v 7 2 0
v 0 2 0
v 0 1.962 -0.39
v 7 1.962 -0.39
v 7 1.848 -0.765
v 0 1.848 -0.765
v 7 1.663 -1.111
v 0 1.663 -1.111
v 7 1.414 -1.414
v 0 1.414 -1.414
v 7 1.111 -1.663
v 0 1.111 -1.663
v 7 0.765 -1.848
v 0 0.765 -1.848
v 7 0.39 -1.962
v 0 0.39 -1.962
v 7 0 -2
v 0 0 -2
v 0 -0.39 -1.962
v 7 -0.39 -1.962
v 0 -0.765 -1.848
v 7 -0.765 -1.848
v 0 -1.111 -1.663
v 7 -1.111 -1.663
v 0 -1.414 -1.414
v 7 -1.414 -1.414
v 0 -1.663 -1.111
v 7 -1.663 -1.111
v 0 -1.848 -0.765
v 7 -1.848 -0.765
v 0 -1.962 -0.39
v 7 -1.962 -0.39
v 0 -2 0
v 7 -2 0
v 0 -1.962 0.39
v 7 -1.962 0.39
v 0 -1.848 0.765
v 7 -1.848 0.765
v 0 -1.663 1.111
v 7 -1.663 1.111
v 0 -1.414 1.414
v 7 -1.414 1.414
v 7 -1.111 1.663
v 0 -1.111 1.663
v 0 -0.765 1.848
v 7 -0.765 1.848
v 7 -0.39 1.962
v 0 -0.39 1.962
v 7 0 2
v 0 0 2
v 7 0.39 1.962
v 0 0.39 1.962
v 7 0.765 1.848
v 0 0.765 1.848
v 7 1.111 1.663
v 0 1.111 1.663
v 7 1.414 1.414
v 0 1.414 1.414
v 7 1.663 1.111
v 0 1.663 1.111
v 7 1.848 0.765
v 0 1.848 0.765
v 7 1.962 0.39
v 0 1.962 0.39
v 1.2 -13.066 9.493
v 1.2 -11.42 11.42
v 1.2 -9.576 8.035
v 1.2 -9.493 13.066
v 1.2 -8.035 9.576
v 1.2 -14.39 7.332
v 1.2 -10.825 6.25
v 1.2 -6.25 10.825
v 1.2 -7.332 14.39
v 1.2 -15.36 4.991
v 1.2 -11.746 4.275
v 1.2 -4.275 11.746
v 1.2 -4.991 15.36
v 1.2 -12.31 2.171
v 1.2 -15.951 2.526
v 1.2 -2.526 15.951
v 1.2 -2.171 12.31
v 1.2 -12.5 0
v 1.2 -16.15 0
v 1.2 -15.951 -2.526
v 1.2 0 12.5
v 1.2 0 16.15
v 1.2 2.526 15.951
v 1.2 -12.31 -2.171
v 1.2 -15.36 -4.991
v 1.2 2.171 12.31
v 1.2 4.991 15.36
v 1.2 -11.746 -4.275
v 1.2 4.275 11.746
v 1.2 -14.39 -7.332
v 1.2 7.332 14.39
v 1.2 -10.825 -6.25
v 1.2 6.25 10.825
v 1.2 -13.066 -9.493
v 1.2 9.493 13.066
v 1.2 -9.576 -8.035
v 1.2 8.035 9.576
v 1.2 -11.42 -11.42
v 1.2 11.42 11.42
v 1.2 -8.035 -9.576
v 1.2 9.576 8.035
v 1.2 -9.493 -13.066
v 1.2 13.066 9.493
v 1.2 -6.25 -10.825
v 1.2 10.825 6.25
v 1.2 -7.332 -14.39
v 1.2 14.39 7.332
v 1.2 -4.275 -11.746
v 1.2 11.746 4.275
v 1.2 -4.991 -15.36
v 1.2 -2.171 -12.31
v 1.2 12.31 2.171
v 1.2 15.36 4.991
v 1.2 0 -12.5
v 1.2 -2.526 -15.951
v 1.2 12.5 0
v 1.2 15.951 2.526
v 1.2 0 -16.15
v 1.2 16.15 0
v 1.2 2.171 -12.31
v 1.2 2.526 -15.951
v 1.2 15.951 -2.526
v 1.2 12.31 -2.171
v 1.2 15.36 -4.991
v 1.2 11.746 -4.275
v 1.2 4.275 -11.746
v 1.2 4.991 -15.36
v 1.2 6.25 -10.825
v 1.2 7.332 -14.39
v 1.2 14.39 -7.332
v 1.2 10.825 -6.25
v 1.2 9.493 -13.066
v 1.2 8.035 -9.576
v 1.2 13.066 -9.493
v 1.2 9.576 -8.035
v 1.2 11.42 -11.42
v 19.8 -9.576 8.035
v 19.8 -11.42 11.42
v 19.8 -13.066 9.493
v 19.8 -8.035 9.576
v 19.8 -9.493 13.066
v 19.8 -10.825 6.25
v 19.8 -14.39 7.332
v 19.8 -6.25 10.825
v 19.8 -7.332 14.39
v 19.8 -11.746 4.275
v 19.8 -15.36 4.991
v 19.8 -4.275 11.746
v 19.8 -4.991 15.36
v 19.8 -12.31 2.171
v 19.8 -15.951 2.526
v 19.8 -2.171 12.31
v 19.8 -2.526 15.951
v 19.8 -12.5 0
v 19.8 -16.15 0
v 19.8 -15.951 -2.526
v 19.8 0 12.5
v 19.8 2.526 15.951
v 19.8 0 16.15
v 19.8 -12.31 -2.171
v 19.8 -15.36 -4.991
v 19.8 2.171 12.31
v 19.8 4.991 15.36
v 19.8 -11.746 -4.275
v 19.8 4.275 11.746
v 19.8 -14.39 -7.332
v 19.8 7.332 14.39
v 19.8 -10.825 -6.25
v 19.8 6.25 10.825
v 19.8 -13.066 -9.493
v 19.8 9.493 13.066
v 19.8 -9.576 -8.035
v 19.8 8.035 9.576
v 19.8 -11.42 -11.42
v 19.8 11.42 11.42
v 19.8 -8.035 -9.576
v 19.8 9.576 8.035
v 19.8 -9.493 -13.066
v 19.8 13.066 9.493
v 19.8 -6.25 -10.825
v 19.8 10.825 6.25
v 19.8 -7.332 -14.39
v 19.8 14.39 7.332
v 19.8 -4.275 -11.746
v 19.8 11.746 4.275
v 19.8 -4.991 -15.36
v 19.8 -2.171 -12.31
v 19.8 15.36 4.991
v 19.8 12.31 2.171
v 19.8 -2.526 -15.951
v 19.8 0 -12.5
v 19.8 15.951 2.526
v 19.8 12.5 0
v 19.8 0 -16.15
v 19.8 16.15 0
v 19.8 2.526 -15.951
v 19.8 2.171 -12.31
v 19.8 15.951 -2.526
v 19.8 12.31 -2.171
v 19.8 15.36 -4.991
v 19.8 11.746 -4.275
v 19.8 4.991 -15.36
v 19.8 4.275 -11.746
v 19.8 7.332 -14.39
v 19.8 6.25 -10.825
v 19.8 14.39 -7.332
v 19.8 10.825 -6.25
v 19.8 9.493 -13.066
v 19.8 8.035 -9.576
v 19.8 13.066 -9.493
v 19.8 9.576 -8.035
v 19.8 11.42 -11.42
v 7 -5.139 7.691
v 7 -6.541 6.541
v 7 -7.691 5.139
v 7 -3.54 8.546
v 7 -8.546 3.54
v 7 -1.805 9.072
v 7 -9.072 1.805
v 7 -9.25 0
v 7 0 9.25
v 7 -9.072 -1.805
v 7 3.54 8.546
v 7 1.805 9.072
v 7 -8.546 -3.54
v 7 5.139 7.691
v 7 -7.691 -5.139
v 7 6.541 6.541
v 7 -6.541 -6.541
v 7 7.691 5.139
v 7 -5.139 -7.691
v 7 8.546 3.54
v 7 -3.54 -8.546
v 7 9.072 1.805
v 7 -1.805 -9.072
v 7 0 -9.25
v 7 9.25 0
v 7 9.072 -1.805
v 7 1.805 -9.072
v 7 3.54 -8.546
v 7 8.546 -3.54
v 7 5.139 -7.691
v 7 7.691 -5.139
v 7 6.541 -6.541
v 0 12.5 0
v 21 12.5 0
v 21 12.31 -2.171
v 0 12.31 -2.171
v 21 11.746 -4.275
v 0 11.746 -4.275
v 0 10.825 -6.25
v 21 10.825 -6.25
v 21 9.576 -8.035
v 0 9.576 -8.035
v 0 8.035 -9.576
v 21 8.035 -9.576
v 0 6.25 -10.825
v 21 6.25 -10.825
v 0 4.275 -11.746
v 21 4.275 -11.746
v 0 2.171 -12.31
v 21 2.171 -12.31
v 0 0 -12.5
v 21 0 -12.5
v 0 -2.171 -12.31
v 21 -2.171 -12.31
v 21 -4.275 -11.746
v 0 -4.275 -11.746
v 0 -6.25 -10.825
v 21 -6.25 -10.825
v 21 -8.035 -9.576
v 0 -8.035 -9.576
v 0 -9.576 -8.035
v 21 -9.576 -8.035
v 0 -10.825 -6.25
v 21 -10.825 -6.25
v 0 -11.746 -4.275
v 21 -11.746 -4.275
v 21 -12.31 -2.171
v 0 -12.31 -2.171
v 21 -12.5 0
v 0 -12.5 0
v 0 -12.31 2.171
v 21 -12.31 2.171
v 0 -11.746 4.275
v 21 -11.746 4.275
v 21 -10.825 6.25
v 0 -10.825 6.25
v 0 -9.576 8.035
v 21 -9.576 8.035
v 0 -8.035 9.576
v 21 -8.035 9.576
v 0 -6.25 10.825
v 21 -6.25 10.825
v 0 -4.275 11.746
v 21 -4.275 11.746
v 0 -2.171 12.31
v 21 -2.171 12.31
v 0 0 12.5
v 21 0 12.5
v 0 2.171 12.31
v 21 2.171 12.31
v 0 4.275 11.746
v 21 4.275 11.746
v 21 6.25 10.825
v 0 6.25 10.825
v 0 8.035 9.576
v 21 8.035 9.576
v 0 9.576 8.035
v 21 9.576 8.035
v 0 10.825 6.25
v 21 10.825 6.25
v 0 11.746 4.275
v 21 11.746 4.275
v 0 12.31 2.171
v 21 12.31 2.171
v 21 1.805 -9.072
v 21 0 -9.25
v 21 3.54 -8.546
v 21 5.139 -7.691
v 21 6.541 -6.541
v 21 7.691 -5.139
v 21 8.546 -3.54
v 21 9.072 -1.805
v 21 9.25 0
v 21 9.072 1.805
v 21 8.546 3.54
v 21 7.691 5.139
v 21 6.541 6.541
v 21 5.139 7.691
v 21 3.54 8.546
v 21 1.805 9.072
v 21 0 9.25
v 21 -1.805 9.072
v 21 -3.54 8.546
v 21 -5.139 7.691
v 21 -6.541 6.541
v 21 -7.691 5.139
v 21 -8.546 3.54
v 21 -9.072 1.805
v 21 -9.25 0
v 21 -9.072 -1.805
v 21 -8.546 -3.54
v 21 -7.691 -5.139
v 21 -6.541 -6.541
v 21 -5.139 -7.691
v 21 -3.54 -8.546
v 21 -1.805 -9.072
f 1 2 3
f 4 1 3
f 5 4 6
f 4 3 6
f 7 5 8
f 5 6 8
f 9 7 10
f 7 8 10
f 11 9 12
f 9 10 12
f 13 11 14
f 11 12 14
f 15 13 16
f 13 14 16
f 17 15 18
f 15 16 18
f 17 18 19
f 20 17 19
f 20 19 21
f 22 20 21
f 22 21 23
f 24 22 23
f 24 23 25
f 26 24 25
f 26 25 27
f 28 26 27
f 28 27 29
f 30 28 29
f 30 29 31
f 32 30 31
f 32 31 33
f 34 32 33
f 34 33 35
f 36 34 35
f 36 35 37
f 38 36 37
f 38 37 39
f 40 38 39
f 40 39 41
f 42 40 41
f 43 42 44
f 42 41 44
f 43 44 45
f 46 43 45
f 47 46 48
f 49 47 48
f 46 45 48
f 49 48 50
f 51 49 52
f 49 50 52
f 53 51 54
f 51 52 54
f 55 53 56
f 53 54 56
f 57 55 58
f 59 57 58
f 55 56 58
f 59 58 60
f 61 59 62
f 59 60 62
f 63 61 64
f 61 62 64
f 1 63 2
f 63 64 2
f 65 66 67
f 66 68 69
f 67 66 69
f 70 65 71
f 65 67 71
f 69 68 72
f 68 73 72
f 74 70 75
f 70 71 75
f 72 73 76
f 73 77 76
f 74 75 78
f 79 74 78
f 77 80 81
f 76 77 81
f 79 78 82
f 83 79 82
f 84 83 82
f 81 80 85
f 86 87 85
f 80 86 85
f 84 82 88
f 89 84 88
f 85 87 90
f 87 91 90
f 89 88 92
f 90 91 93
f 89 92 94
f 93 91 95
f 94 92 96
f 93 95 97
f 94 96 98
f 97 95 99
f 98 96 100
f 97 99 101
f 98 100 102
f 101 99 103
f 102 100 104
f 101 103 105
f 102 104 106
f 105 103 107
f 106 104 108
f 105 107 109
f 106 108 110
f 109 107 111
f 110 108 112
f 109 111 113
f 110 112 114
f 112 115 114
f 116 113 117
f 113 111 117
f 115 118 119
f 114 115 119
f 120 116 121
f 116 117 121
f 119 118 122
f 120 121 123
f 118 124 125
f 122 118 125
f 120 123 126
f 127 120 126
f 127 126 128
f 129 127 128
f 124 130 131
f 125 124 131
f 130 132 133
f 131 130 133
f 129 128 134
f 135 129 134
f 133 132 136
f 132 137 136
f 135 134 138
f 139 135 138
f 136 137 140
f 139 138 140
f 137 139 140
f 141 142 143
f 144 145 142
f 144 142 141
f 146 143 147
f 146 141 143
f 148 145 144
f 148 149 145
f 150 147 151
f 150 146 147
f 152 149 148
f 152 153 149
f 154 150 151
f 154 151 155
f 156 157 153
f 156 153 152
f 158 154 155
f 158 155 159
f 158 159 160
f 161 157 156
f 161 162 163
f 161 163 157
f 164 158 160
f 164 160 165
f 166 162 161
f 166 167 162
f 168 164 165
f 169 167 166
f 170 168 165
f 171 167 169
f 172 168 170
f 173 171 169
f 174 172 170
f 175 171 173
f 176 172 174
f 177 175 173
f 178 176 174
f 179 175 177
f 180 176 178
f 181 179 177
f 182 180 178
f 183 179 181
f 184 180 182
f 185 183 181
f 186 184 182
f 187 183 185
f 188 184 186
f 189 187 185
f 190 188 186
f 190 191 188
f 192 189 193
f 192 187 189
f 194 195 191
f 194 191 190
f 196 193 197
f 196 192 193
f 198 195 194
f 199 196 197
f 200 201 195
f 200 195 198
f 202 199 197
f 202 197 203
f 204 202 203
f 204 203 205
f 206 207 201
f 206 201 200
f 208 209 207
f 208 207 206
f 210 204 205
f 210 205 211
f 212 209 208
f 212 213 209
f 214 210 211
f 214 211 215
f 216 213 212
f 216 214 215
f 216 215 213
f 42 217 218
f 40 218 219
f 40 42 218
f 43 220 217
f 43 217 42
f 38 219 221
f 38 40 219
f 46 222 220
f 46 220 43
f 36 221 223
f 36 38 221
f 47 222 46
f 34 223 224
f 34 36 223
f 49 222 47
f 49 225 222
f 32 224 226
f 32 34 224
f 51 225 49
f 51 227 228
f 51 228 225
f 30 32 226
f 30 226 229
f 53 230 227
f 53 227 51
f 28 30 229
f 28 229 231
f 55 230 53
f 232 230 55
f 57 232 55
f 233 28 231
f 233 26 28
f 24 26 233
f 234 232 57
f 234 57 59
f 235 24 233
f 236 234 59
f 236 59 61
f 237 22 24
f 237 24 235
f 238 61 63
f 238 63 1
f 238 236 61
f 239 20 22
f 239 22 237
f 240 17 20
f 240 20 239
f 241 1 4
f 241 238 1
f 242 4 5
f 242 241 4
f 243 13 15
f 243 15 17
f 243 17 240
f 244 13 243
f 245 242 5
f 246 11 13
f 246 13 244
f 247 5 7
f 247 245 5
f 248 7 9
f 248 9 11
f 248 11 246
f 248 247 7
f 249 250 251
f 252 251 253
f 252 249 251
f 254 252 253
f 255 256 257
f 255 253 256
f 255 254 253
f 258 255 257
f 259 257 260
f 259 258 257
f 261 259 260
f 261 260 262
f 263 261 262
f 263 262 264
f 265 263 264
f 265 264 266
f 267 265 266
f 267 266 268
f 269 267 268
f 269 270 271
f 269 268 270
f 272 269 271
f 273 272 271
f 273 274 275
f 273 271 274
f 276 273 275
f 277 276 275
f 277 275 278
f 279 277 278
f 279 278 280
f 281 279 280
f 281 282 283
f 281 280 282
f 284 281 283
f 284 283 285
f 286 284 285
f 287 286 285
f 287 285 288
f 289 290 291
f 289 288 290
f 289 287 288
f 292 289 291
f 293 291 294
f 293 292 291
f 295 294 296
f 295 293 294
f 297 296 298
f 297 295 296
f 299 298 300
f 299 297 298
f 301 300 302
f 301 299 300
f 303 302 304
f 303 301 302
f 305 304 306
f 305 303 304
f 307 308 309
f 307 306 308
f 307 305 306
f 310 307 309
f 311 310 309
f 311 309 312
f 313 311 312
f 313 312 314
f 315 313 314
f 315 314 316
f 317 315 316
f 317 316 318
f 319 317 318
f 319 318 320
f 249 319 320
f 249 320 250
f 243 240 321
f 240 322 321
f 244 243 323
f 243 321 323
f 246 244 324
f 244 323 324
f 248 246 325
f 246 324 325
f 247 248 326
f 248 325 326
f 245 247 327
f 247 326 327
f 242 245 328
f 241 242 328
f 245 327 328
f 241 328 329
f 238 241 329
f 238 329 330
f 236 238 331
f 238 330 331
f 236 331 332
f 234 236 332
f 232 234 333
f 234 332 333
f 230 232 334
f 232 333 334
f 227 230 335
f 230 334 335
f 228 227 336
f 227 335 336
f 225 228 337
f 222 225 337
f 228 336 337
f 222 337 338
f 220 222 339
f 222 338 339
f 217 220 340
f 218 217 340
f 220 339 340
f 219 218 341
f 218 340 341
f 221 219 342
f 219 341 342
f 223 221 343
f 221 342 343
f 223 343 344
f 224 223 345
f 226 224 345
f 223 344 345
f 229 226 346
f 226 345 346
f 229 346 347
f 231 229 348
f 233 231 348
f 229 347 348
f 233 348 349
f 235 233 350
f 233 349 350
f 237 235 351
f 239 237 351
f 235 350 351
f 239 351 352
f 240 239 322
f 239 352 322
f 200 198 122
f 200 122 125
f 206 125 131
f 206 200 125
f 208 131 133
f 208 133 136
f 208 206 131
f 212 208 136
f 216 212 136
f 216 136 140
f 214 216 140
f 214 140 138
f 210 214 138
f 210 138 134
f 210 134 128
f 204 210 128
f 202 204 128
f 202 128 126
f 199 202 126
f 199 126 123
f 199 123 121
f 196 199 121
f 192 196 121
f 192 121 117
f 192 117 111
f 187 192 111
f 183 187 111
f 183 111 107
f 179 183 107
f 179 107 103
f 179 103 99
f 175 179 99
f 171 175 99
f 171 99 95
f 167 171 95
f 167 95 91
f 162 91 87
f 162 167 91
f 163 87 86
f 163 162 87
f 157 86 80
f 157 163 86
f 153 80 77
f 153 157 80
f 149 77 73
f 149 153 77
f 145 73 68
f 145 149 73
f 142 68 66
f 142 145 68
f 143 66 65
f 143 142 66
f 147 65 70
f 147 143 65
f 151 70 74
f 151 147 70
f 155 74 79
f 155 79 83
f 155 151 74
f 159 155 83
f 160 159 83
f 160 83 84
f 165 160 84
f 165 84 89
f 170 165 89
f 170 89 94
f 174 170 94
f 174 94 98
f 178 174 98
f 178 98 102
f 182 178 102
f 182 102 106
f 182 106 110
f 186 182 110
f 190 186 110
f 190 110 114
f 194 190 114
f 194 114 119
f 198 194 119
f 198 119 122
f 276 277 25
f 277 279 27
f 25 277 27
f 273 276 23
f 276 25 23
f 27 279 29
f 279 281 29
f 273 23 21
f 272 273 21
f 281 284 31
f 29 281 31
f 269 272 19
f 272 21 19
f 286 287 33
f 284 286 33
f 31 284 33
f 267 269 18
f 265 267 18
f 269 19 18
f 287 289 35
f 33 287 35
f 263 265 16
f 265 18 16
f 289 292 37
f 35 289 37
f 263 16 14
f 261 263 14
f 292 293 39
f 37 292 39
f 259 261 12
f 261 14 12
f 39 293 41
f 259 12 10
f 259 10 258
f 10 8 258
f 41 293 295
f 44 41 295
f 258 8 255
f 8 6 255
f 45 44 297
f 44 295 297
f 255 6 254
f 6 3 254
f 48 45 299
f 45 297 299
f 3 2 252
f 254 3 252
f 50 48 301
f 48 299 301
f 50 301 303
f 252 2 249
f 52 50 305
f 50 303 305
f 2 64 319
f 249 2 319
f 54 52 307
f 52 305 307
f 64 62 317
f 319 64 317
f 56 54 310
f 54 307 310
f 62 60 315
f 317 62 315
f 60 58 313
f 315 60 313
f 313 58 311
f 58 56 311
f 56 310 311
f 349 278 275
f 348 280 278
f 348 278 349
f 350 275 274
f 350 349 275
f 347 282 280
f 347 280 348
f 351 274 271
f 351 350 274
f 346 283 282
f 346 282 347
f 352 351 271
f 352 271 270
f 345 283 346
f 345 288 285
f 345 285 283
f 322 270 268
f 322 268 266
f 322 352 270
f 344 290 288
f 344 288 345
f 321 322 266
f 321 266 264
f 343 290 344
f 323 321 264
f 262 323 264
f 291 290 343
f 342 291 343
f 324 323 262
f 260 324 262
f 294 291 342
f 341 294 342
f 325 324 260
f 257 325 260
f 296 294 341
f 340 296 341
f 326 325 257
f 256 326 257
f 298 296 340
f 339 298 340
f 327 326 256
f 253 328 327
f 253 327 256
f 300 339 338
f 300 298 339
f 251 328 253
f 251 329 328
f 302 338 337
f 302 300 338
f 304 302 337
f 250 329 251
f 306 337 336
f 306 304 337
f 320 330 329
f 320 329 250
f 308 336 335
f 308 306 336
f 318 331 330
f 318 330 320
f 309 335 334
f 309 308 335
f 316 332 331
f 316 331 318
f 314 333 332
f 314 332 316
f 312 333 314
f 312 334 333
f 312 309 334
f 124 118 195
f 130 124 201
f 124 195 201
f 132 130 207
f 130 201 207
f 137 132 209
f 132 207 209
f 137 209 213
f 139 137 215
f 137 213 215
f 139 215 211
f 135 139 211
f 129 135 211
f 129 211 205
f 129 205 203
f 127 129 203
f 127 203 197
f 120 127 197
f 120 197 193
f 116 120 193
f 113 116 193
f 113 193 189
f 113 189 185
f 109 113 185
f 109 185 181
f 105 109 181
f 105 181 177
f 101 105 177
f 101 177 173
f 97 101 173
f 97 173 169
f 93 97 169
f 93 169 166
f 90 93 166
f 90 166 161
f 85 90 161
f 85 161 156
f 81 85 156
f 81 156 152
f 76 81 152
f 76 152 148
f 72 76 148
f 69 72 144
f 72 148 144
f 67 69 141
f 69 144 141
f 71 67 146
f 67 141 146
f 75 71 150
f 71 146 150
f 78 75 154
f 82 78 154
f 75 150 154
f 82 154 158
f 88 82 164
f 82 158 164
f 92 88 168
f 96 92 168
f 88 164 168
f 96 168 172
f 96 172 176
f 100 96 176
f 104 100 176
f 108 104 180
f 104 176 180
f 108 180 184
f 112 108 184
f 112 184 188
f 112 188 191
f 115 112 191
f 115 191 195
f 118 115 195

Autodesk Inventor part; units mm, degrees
ref_plane "YZ Plane" through (0, 0, 0) normal (1, 0, 0) x (0, 1, 0)
ref_plane "XZ Plane" through (0, 0, 0) normal (0, 1, 0) x (-1, 0, 0)
sketch "Esboço1" plane through (0, 0, 0) normal (1, 0, 0) x (0, 1, 0)
  circle A0 centre (0, 0) radius 12.5
  circle A1 centre (0, 0) radius 2
  dimension "d0" = 25
  dimension "d1" = 4
extrude "Extrusão1" add sketch "Esboço1" along normal blind 21
sketch "Esboço2" plane through (21, 0, 0) normal (1, 0, 0) x (0, 0, -1)
  circle A0 centre (0, 0) radius 9.25
  dimension "d4" = 18.5
extrude "Extrusão2" cut sketch "Esboço2" against normal blind 14
ref_plane "Plano de trabalho1" through (19.8, 0, 0) normal (1, 0, 0) x (0, 0, -1)
sketch "Esboço3" plane through (19.8, 0, 0) normal (1, 0, 0) x (0, 0, -1)
  circle A0 centre (0, 0) radius 12.5 projected
  circle A1 centre (0, 0) radius 2 projected
  circle A2 centre (0, 0) radius 16.15
  dimension "d8" = 32.3
extrude "Extrusão3" add sketch "Esboço3" against normal blind 18.6 separate body contours A2
properties part number "Roda"
